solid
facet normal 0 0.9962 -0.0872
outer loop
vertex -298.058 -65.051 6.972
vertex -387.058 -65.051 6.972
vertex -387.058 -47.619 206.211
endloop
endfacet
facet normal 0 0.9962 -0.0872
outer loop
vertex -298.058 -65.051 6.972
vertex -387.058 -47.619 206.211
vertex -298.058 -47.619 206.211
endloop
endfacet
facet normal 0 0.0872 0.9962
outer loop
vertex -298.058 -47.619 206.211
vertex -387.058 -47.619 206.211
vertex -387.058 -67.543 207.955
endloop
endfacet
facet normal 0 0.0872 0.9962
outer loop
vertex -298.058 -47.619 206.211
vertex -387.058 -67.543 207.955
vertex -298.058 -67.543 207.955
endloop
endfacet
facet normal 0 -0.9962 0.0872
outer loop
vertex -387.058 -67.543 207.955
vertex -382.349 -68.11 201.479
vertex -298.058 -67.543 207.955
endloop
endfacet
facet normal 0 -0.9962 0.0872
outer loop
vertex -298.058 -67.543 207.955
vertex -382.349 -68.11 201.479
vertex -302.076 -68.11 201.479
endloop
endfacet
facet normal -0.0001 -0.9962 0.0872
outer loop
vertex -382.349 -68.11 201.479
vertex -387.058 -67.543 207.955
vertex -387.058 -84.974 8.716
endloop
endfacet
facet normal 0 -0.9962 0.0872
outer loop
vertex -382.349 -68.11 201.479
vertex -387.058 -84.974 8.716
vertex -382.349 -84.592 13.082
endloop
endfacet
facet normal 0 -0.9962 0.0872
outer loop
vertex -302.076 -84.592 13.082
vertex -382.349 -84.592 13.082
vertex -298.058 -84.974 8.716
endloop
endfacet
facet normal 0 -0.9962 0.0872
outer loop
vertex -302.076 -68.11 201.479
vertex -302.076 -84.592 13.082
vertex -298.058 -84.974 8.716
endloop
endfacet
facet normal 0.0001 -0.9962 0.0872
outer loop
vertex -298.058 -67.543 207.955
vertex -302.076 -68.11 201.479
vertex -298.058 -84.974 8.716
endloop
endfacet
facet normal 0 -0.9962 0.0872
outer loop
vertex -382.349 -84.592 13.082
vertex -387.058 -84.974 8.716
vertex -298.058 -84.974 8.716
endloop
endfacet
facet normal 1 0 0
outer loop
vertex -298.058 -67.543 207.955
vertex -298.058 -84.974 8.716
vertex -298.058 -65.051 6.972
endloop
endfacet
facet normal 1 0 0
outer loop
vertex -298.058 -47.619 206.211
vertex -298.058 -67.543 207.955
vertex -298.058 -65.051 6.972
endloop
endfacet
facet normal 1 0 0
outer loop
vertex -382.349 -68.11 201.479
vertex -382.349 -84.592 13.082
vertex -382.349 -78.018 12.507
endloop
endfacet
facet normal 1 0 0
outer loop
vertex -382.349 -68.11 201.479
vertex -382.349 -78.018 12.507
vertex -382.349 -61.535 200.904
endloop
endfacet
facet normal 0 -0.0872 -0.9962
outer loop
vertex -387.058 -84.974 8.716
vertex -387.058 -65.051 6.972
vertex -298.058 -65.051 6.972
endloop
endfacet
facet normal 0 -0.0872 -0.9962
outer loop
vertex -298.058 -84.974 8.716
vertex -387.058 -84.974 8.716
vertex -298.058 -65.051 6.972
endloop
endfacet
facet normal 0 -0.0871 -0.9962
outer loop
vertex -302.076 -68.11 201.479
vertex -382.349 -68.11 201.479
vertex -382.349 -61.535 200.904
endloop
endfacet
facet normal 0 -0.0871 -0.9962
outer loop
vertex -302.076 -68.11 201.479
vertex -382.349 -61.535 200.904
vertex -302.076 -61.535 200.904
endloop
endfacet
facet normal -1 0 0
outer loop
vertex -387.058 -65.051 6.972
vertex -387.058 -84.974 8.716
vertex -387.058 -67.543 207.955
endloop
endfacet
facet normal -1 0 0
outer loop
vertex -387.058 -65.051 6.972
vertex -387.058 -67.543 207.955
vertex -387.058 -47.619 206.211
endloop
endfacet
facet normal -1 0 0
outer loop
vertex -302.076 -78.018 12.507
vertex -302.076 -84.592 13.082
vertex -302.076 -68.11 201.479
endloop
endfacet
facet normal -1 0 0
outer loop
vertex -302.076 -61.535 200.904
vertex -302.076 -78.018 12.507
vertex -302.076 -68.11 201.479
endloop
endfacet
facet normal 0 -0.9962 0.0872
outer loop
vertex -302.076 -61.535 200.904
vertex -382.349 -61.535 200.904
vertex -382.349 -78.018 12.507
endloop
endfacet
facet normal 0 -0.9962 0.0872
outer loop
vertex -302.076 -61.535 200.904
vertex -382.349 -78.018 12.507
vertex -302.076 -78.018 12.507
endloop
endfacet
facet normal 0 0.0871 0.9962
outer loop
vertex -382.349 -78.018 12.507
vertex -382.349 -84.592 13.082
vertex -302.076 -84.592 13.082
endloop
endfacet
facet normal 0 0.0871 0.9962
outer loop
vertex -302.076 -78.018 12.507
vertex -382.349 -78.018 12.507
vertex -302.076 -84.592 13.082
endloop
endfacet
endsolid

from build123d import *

# Parameters (mm, degrees)
F0_W      = 445
F0_H      = 100
F1_DEPTH  = 1000
F2_ANGLE  = -5
F3_ANGLE  = -120
F5_ANGLE  = -120
F8_ANGLE  = -120
F10_ANGLE = -120
F12_ANGLE = -120
F14_W     = 401.3673663139
F14_H     = 945.5828145146
F15_DEPTH = 33
F17_SCALE = 0.2


with BuildPart() as f1:
    # F0 (on Top) → F1 (new body)
    with BuildSketch(Plane.XY):
        with Locations((-164.5579262078, -35.3550005704)):
            Rectangle(F0_W, F0_H)
    extrude(amount=F1_DEPTH)


with BuildPart() as f1_1:
    # F2: moved
    add(f1.part.rotate(Axis((-164.5579262078, 14.6449994296, 0), (1, 0, 0)), F2_ANGLE))


with BuildPart() as f3_1:
    # F3: copy of F1
    add(f1_1.part.rotate(Axis((57.9420737922, -41.3965990058, 506.8129233206), (0, -0.0871557427, -0.9961946981)), F3_ANGLE))


with BuildPart() as f3_1_1:
    # F4: moved
    add(f3_1.part.moved(Location((87, 55, 0))))


with BuildPart() as f5_1:
    # F5: copy of F3_1
    add(f3_1_1.part.rotate(Axis((280.8395334138, -420.1211463803, 544.7589043088), (0, -0.0871557427, -0.9961946981)), F5_ANGLE))


with BuildPart() as f5_1_1:
    # F6: moved
    add(f5_1.part.moved(Location((91, -75, 0))))


with BuildPart() as f3_1_2:
    # F7: moved
    add(f3_1_1.part.moved(Location((13, -17, 0))))


with BuildPart() as f8_1:
    # F8: copy of F5_1
    add(f5_1_1.part.rotate(Axis((62.7369930353, -829.2262239457, 573.9893110223), (0, -0.0871557427, -0.9961946981)), F8_ANGLE))


with BuildPart() as f8_1_1:
    # F9: moved
    add(f8_1.part.moved(Location((-17, -111, 0))))


with BuildPart() as f10_1:
    # F10: copy of F8_1
    add(f8_1_1.part.rotate(Axis((-399.2630069647, -840.6067541365, 565.2737367476), (0, -0.0871557427, -0.9961946981)), F10_ANGLE))


with BuildPart() as f10_1_1:
    # F11: moved
    add(f10_1.part.moved(Location((-104, -42, 0))))


with BuildPart() as f12_1:
    # F12: copy of F10_1
    add(f10_1_1.part.rotate(Axis((-639.1604665862, -448.8822067619, 527.3277557595), (0, -0.0871557427, -0.9961946981)), F12_ANGLE))


with BuildPart() as f12_1_1:
    # F13: moved
    add(f12_1.part.moved(Location((-65, 57, 0))))


with BuildPart() as f1_2:
    add(f1_1.part)

    # F14 (on face) → F15 (cut)
    with BuildSketch(Plane(origin=(0, -85.0857156038, 7.4440355433), x_dir=(1, 0, 0), z_dir=(0, -0.9961946981, 0.0871557427))):
        with Locations((-162.8310680389, 495.9846995771)):
            Rectangle(F14_W, F14_H)
    extrude(amount=-F15_DEPTH, mode=Mode.SUBTRACT)


with BuildPart() as f1_3:
    # F17: moved
    add(f1_2.part.scale(F17_SCALE).moved(Location((-309.6463409662, -67.9795763037, 6.9724594198))))


solid = f1_3.part
